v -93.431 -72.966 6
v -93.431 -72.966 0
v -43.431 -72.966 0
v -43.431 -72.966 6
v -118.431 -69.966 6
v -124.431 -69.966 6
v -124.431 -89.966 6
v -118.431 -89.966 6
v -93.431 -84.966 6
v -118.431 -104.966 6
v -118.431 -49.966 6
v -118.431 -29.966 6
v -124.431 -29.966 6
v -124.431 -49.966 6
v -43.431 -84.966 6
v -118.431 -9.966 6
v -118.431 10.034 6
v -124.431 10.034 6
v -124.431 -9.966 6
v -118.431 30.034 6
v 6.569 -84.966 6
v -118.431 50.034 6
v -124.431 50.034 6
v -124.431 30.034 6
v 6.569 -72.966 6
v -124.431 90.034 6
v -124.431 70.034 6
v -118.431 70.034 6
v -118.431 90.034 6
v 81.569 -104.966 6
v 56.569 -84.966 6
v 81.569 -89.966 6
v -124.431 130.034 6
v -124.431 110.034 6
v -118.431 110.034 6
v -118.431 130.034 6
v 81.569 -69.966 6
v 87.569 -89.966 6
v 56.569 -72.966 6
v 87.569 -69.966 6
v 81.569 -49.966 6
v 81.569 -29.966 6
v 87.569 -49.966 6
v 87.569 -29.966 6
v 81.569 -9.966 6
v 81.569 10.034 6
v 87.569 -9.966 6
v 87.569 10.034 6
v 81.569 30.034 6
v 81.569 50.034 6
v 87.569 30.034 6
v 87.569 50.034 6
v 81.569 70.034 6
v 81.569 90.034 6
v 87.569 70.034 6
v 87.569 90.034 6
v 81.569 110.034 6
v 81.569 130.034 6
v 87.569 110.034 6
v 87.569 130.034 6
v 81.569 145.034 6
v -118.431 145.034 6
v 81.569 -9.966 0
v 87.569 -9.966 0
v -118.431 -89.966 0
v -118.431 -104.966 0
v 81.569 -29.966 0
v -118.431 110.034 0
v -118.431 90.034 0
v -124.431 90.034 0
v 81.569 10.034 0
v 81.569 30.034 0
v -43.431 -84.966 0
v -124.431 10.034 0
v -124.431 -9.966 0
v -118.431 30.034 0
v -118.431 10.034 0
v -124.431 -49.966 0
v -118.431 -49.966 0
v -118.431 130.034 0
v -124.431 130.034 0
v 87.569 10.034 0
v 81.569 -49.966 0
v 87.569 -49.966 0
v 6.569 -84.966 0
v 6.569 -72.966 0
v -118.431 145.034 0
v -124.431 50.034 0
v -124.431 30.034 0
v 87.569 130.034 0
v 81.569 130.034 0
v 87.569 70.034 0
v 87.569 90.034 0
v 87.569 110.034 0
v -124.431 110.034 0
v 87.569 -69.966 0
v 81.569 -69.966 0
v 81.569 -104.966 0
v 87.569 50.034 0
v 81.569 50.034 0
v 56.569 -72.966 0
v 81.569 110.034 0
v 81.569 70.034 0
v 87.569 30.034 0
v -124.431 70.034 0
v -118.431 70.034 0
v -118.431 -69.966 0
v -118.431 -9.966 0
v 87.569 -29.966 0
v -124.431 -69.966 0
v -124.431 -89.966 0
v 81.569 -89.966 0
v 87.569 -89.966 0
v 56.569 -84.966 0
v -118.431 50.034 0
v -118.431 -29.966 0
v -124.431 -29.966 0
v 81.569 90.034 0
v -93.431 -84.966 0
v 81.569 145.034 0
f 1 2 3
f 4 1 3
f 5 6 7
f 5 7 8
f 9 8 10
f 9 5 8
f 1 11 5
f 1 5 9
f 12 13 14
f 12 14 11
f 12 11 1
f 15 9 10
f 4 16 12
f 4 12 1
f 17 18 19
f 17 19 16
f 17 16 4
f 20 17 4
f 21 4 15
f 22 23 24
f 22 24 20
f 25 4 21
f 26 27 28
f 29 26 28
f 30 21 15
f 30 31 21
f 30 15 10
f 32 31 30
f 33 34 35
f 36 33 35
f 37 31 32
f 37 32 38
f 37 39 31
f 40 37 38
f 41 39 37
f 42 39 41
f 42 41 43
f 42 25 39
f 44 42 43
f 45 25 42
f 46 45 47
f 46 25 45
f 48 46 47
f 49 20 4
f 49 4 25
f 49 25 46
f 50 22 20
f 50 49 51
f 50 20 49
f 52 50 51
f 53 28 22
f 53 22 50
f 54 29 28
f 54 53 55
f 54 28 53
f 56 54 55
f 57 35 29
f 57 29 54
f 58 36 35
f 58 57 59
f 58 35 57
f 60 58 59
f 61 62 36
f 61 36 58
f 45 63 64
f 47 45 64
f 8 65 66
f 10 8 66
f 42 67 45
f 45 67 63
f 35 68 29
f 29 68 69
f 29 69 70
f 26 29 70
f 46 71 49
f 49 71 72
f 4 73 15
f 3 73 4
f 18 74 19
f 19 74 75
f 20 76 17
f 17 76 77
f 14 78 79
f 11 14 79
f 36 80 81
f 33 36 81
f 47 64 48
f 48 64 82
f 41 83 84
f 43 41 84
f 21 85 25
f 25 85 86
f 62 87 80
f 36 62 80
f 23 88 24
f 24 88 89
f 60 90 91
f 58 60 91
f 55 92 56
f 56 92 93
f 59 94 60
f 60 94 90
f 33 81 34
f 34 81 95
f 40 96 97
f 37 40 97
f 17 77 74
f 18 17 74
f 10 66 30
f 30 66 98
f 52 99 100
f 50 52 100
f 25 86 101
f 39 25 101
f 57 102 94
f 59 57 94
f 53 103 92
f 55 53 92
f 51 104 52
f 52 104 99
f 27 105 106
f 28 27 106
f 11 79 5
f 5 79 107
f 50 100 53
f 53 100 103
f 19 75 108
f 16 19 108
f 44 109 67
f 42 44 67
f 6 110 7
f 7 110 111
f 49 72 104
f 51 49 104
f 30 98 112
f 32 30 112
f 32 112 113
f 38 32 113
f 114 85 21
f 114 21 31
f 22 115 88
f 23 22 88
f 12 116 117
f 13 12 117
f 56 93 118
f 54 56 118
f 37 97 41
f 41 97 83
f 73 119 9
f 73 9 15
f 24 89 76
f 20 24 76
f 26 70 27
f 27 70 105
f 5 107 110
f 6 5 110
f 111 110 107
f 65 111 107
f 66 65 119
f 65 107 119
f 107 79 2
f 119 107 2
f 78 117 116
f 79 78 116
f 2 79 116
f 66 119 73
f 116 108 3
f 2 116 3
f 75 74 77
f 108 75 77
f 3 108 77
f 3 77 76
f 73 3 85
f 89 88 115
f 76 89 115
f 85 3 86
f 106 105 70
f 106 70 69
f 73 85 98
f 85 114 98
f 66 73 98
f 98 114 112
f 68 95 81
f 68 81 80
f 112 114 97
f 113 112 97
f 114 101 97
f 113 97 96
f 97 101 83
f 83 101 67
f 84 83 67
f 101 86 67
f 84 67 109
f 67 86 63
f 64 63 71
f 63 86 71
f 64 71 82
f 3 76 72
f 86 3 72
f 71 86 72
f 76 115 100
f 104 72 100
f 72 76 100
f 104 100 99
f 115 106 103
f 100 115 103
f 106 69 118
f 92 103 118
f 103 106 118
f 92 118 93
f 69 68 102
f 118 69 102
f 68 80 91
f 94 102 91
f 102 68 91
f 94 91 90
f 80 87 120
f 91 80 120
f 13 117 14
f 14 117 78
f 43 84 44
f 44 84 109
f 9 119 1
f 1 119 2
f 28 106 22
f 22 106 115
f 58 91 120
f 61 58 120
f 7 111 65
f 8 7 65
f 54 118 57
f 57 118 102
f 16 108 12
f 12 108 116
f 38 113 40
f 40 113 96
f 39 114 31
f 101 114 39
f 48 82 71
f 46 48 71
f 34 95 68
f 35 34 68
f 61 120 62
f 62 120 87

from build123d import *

# Parameters (mm, degrees)
SKETCH_1_W      = 50
SKETCH_1_H      = 12
EXTRUDE_1_DEPTH = 6


with BuildPart() as part:
    # 草图1 → 凸台-拉伸1 (new body)
    with BuildSketch(Plane.XY):
        Polygon((-118.430922138, 110.033611019), (-118.430922138, 90.033611019), (-124.430922138, 90.033611019), (-124.430922138, 70.033611019), (-118.430922138, 70.033611019), (-118.430922138, 50.033611019), (-124.430922138, 50.033611019), (-124.430922138, 30.033611019), (-118.430922138, 30.033611019), (-118.430922138, 10.033611019), (-124.430922138, 10.033611019), (-124.430922138, -9.966388981), (-118.430922138, -9.966388981), (-118.430922138, -29.966388981), (-124.430922138, -29.966388981), (-124.430922138, -49.966388981), (-118.430922138, -49.966388981), (-118.430922138, -69.966388981), (-124.430922138, -69.966388981), (-124.430922138, -89.966388981), (-118.430922138, -89.966388981), (-118.430922138, -104.966388981), (81.569077862, -104.966388981), (81.569077862, -89.966388981), (87.569077862, -89.966388981), (87.569077862, -69.966388981), (81.569077862, -69.966388981), (81.569077862, -49.966388981), (87.569077862, -49.966388981), (87.569077862, -29.966388981), (81.569077862, -29.966388981), (81.569077862, -9.966388981), (87.569077862, -9.966388981), (87.569077862, 10.033611019), (81.569077862, 10.033611019), (81.569077862, 30.033611019), (87.569077862, 30.033611019), (87.569077862, 50.033611019), (81.569077862, 50.033611019), (81.569077862, 70.033611019), (87.569077862, 70.033611019), (87.569077862, 90.033611019), (81.569077862, 90.033611019), (81.569077862, 110.033611019), (87.569077862, 110.033611019), (87.569077862, 130.033611019), (81.569077862, 130.033611019), (81.569077862, 145.033611019), (-118.430922138, 145.033611019), (-118.430922138, 130.033611019), (-124.430922138, 130.033611019), (-124.430922138, 110.033611019), align=None)
        with Locations((-68.430922138, -78.966388981)):
            Rectangle(SKETCH_1_W, SKETCH_1_H, mode=Mode.SUBTRACT)
        with Locations((31.569077862, -78.966388981)):
            Rectangle(SKETCH_1_W, SKETCH_1_H, mode=Mode.SUBTRACT)
    extrude(amount=EXTRUDE_1_DEPTH)


solid = part.part
